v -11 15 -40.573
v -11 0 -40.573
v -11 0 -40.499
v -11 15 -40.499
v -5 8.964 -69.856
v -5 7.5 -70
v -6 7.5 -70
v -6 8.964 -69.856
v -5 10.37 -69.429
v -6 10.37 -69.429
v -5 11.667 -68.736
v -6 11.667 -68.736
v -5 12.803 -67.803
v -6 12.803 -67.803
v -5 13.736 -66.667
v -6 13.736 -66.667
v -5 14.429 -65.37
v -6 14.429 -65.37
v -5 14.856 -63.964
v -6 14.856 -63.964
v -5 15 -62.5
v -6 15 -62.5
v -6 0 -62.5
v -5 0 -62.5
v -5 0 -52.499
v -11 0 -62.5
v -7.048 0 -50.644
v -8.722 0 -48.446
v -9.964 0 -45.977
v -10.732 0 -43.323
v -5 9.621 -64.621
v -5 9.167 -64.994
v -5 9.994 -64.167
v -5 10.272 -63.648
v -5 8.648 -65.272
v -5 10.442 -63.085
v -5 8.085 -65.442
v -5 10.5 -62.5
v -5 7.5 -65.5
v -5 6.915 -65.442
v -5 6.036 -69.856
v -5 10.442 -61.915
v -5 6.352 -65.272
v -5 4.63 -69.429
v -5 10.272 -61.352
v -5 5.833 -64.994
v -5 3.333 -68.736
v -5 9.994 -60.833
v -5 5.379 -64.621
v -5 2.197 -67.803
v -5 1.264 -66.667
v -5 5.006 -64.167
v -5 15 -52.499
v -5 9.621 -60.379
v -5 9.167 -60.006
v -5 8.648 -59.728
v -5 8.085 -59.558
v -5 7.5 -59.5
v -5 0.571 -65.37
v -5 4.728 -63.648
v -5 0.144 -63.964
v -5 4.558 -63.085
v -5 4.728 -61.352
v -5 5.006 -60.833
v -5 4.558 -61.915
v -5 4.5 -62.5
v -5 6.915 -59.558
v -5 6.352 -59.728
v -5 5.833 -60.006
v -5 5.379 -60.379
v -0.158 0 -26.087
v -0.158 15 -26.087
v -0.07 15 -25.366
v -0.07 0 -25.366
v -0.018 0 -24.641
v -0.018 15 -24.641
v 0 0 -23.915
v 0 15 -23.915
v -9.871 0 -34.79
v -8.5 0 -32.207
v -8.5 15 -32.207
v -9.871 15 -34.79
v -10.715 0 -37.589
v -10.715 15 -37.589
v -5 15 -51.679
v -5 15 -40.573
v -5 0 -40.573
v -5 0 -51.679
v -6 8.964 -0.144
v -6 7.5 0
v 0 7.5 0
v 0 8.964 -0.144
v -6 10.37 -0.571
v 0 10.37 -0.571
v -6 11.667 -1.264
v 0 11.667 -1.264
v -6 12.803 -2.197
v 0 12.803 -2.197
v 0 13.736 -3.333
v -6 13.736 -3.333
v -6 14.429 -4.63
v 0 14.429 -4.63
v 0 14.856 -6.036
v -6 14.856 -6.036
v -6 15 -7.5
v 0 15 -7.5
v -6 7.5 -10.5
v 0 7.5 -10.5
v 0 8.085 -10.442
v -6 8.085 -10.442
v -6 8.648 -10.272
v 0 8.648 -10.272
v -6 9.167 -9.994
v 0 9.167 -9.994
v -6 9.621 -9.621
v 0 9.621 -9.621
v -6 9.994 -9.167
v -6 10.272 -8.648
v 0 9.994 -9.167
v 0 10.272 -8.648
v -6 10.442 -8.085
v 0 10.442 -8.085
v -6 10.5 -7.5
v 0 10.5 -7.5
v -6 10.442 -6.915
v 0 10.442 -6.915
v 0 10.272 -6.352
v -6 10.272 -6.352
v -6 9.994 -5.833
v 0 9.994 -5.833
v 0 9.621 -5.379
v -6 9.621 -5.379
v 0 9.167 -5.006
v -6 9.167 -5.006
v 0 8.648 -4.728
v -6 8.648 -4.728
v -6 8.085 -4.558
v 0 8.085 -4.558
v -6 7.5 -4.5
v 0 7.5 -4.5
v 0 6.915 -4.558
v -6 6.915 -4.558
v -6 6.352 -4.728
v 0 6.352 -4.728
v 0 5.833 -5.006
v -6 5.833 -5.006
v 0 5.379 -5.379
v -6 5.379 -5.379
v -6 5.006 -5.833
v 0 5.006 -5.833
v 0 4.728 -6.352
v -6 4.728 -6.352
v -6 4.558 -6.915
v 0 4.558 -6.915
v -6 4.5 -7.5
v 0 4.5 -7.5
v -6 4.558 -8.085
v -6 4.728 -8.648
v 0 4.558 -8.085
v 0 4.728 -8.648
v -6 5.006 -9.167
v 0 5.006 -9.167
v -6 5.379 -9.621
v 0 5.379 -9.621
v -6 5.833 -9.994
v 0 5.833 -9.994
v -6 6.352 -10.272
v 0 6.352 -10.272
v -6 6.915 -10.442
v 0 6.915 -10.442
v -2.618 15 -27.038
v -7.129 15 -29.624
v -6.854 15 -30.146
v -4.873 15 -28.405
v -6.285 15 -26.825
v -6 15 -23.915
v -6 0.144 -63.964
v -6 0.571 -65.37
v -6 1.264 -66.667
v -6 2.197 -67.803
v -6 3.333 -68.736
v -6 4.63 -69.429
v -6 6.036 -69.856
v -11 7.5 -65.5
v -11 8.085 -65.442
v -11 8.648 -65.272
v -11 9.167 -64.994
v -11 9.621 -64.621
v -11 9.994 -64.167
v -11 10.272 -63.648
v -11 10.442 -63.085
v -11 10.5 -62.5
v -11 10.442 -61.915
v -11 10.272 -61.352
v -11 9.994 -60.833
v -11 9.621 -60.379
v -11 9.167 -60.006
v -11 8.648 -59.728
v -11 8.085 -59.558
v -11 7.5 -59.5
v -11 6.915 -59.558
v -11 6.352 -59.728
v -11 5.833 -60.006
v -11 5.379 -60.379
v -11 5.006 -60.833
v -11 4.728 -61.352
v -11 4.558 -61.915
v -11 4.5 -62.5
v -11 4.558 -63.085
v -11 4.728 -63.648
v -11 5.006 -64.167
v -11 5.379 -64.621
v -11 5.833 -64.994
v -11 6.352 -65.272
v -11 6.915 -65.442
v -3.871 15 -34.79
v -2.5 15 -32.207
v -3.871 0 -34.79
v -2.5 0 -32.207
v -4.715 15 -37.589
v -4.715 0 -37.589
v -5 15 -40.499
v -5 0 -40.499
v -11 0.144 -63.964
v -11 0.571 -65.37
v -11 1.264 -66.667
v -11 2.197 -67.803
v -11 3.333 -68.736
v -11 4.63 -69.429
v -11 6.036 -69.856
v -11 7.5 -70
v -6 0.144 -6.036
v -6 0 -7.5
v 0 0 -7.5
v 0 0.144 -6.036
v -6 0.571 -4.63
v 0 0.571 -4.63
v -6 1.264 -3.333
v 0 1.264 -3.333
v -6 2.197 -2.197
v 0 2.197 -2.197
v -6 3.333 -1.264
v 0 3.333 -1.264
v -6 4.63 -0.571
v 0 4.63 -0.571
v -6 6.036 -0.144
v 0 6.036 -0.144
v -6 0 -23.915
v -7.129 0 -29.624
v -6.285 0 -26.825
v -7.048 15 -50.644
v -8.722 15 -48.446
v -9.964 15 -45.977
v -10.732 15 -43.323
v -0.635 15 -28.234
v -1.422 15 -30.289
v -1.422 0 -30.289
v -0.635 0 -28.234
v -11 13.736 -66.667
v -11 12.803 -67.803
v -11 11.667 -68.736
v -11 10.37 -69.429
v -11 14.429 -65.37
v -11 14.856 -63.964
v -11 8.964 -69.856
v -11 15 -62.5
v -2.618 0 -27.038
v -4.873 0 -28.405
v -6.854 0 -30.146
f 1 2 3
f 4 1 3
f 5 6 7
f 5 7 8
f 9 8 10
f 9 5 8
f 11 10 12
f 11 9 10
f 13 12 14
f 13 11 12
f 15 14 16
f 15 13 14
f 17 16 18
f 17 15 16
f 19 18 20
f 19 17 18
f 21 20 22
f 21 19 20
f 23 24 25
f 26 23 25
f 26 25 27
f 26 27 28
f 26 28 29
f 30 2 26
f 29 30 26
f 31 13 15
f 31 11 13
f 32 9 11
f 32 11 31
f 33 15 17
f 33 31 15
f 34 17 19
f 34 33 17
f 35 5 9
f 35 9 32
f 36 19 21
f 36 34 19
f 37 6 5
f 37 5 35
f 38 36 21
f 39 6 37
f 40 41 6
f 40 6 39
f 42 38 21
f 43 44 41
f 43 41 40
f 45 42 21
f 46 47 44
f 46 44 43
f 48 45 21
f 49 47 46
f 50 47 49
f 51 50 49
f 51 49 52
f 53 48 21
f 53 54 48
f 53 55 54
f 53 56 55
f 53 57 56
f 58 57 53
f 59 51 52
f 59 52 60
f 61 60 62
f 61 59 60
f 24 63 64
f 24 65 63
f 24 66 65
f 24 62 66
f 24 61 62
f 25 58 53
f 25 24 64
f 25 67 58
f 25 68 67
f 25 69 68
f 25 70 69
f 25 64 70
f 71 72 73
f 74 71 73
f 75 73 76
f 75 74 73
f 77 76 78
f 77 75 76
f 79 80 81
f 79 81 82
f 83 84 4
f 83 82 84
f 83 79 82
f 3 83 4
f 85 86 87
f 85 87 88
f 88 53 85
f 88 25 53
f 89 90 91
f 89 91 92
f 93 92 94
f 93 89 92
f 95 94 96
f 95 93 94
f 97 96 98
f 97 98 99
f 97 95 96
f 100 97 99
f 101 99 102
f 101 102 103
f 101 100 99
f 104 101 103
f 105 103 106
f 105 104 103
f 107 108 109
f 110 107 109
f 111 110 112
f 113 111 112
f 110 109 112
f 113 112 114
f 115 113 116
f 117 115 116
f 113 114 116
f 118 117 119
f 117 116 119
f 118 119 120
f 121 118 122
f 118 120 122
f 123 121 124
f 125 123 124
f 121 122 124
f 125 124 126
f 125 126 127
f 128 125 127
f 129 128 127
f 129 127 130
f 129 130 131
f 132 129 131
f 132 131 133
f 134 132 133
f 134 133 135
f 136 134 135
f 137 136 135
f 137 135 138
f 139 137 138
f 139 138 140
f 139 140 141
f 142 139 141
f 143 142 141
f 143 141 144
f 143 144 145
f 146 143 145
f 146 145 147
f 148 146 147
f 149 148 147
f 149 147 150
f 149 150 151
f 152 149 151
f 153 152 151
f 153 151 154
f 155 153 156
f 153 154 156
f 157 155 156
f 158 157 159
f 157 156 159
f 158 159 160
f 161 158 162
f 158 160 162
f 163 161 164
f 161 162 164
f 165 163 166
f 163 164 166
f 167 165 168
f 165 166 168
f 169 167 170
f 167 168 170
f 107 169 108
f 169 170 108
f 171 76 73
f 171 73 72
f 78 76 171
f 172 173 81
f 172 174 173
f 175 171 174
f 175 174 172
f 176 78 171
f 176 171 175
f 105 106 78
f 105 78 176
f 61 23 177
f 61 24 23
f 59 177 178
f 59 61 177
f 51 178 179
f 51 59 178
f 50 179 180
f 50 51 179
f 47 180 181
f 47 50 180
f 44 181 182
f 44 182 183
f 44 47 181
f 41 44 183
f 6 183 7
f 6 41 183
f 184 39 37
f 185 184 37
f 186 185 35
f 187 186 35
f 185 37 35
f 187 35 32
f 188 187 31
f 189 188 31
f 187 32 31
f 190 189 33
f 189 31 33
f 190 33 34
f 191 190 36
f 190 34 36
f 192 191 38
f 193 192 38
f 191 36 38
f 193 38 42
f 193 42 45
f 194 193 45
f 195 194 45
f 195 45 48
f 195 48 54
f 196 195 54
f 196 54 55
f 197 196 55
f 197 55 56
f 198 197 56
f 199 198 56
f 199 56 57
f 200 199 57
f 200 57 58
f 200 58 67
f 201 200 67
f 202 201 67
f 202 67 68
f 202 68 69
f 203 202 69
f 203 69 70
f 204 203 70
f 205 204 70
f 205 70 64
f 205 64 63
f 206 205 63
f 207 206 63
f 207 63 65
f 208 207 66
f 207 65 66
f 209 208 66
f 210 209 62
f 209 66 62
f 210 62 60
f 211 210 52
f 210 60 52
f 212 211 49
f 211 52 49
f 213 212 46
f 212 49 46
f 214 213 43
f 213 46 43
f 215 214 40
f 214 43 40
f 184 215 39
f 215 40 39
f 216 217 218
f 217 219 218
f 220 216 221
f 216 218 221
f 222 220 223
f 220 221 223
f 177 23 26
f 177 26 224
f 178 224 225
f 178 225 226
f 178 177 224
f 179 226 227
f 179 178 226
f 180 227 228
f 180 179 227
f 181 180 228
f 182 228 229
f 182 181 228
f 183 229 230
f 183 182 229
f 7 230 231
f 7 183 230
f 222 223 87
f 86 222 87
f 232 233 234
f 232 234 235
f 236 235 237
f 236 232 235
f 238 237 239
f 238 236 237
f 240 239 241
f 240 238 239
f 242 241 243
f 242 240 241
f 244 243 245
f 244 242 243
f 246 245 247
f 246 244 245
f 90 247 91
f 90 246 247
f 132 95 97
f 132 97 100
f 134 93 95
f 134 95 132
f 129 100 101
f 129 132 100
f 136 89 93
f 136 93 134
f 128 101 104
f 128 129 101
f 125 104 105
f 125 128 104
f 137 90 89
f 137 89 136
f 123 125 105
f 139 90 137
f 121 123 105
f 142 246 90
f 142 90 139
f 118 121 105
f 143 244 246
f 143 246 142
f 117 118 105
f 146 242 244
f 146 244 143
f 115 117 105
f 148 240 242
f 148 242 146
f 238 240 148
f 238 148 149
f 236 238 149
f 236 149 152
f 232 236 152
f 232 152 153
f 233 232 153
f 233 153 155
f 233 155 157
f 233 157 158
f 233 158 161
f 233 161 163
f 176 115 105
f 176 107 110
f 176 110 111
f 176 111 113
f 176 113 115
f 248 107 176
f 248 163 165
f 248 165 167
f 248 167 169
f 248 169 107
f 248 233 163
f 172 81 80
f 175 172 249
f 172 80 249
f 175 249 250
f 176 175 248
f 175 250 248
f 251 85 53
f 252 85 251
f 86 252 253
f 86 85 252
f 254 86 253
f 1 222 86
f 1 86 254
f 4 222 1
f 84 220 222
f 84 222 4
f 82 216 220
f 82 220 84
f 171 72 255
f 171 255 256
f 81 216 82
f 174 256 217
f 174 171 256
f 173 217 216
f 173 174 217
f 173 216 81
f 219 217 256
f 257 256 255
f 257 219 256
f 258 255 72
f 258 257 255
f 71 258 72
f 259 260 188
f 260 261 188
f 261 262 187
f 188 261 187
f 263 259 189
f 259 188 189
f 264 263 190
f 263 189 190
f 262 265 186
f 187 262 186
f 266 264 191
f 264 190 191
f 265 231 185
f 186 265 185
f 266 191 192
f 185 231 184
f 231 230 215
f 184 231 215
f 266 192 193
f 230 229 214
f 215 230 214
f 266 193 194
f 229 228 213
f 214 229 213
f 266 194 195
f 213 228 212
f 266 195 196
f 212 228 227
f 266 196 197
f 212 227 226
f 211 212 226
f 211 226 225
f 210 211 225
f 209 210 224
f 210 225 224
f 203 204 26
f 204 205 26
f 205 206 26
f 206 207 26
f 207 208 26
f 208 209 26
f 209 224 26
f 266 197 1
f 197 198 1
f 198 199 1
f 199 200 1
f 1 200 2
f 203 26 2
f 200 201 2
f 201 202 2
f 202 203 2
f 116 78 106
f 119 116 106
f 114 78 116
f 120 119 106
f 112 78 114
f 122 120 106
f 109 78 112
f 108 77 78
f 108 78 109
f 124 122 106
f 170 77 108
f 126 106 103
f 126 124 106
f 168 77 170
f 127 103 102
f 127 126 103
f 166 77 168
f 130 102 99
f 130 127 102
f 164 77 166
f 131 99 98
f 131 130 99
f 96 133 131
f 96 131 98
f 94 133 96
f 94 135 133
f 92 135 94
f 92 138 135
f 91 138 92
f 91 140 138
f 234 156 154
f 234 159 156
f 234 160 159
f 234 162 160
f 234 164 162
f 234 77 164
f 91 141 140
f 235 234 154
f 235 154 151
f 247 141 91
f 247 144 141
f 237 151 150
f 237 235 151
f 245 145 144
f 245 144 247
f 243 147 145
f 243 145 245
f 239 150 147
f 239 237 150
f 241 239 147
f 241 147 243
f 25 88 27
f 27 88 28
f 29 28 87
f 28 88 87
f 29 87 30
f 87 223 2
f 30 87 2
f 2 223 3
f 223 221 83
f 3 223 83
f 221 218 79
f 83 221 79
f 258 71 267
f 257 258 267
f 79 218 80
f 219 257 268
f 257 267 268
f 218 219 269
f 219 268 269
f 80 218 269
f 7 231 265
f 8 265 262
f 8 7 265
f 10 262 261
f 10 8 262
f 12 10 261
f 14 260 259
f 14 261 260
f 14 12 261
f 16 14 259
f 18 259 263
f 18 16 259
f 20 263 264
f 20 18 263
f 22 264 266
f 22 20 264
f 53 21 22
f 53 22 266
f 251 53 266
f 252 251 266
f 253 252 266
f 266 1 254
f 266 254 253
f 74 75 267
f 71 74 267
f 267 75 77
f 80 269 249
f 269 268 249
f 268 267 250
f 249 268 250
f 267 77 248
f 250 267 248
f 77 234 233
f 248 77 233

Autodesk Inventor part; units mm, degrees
ref_plane "YZ Plane" through (0, 0, 0) normal (1, 0, 0) x (0, 1, 0)
ref_plane "XZ Plane" through (0, 0, 0) normal (0, 1, 0) x (-1, 0, 0)
ref_plane "XY Plane" through (0, 0, 0) normal (0, 0, 1) x (1, 0, 0)
sketch "Sketch1" plane through (0, 0, 0) normal (0, 1, 0) x (-1, 0, 0)
  line L0 (0, 0) -> (6, 0)
  line L1 (6, 0) -> (76, 0) construction
  line L2 (6, -70) -> (5, -70)
  line L3 (5, -70) -> (5, -51.6792)
  line L4 (5, -70) -> (11, -70)
  line L5 (11, -70) -> (11, -40.5)
  line L6 (5.0002, -40.5) -> (5, -40.5)
  line L7 (5, -40.5) -> (5, -70)
  line L8 (6, 0) -> (6, -23.9152)
  line L9 (0, -23.9152) -> (0, 0)
  arc A0 (-0.0017, -54.956) -> (0, -54.9555) centre (-3.9998, -40.4987) ccw
  arc A1 (-0.0017, -51.6807) -> (0, -51.6792) centre (-9.9998, -40.4987) ccw
  arc A2 (5, -40.5731) -> (2.5001, -32.2069) centre (-9.9998, -40.4987) ccw
  arc A3 (11, -40.5731) -> (8.5001, -32.2069) centre (-3.9998, -40.4987) ccw
  arc A4 (6, -23.9152) -> (8.5001, -32.2069) centre (21, -23.9152) ccw
  arc A5 (0, -23.9152) -> (2.5001, -32.2069) centre (15, -23.9152) ccw
  point P0 (6, -29.3181)
  point P1 (0, -29.3181)
  dimension "d0" = 6
extrude "Extrusion1" add sketch "Sketch1" along normal blind 15 contours L0 L8 A4 A0 A5 L9 | A0 L5 L3 L7 A1 A5 | L5 L4 L2 L3 A0
fillet "Fillet1" radius 7.5 4 edges at (-3, 0, 0) (-3, 15, 0) (-5.5, 15, -70) (-5.5, 0, -70)
sketch "Sketch3" plane through (0, 0, -23.9152) normal (1, 0, 0) x (0, 0, -1)
  circle A0 centre (-16.4152, 7.5) radius 3
  arc A1 (-16.4152, 15) -> (-16.4152, 0) centre (-16.4152, 7.5) ccw projected
  line L0 (-16.4152, 15) -> (0, 15) projected
  circle A2 centre (38.5848, 7.5) radius 3
  arc A3 (38.5848, 0) -> (38.5848, 15) centre (38.5848, 7.5) ccw projected
  line L1 (16.6579, 15) -> (38.5848, 15) projected
  point P0 (-23.9152, 0)
  point P1 (-23.9152, 7.5)
  point P2 (46.0848, 7.5)
  dimension "d15" = 6
  dimension "d16" = 7.5
  dimension "d17" = 7.5
  dimension "d18" = 6
  dimension "d19" = 7.5
  dimension "d20" = 7.5
extrude "Extrusion2" cut sketch "Sketch3" against normal blind 15
properties part number "atividade_14A_uniao"
